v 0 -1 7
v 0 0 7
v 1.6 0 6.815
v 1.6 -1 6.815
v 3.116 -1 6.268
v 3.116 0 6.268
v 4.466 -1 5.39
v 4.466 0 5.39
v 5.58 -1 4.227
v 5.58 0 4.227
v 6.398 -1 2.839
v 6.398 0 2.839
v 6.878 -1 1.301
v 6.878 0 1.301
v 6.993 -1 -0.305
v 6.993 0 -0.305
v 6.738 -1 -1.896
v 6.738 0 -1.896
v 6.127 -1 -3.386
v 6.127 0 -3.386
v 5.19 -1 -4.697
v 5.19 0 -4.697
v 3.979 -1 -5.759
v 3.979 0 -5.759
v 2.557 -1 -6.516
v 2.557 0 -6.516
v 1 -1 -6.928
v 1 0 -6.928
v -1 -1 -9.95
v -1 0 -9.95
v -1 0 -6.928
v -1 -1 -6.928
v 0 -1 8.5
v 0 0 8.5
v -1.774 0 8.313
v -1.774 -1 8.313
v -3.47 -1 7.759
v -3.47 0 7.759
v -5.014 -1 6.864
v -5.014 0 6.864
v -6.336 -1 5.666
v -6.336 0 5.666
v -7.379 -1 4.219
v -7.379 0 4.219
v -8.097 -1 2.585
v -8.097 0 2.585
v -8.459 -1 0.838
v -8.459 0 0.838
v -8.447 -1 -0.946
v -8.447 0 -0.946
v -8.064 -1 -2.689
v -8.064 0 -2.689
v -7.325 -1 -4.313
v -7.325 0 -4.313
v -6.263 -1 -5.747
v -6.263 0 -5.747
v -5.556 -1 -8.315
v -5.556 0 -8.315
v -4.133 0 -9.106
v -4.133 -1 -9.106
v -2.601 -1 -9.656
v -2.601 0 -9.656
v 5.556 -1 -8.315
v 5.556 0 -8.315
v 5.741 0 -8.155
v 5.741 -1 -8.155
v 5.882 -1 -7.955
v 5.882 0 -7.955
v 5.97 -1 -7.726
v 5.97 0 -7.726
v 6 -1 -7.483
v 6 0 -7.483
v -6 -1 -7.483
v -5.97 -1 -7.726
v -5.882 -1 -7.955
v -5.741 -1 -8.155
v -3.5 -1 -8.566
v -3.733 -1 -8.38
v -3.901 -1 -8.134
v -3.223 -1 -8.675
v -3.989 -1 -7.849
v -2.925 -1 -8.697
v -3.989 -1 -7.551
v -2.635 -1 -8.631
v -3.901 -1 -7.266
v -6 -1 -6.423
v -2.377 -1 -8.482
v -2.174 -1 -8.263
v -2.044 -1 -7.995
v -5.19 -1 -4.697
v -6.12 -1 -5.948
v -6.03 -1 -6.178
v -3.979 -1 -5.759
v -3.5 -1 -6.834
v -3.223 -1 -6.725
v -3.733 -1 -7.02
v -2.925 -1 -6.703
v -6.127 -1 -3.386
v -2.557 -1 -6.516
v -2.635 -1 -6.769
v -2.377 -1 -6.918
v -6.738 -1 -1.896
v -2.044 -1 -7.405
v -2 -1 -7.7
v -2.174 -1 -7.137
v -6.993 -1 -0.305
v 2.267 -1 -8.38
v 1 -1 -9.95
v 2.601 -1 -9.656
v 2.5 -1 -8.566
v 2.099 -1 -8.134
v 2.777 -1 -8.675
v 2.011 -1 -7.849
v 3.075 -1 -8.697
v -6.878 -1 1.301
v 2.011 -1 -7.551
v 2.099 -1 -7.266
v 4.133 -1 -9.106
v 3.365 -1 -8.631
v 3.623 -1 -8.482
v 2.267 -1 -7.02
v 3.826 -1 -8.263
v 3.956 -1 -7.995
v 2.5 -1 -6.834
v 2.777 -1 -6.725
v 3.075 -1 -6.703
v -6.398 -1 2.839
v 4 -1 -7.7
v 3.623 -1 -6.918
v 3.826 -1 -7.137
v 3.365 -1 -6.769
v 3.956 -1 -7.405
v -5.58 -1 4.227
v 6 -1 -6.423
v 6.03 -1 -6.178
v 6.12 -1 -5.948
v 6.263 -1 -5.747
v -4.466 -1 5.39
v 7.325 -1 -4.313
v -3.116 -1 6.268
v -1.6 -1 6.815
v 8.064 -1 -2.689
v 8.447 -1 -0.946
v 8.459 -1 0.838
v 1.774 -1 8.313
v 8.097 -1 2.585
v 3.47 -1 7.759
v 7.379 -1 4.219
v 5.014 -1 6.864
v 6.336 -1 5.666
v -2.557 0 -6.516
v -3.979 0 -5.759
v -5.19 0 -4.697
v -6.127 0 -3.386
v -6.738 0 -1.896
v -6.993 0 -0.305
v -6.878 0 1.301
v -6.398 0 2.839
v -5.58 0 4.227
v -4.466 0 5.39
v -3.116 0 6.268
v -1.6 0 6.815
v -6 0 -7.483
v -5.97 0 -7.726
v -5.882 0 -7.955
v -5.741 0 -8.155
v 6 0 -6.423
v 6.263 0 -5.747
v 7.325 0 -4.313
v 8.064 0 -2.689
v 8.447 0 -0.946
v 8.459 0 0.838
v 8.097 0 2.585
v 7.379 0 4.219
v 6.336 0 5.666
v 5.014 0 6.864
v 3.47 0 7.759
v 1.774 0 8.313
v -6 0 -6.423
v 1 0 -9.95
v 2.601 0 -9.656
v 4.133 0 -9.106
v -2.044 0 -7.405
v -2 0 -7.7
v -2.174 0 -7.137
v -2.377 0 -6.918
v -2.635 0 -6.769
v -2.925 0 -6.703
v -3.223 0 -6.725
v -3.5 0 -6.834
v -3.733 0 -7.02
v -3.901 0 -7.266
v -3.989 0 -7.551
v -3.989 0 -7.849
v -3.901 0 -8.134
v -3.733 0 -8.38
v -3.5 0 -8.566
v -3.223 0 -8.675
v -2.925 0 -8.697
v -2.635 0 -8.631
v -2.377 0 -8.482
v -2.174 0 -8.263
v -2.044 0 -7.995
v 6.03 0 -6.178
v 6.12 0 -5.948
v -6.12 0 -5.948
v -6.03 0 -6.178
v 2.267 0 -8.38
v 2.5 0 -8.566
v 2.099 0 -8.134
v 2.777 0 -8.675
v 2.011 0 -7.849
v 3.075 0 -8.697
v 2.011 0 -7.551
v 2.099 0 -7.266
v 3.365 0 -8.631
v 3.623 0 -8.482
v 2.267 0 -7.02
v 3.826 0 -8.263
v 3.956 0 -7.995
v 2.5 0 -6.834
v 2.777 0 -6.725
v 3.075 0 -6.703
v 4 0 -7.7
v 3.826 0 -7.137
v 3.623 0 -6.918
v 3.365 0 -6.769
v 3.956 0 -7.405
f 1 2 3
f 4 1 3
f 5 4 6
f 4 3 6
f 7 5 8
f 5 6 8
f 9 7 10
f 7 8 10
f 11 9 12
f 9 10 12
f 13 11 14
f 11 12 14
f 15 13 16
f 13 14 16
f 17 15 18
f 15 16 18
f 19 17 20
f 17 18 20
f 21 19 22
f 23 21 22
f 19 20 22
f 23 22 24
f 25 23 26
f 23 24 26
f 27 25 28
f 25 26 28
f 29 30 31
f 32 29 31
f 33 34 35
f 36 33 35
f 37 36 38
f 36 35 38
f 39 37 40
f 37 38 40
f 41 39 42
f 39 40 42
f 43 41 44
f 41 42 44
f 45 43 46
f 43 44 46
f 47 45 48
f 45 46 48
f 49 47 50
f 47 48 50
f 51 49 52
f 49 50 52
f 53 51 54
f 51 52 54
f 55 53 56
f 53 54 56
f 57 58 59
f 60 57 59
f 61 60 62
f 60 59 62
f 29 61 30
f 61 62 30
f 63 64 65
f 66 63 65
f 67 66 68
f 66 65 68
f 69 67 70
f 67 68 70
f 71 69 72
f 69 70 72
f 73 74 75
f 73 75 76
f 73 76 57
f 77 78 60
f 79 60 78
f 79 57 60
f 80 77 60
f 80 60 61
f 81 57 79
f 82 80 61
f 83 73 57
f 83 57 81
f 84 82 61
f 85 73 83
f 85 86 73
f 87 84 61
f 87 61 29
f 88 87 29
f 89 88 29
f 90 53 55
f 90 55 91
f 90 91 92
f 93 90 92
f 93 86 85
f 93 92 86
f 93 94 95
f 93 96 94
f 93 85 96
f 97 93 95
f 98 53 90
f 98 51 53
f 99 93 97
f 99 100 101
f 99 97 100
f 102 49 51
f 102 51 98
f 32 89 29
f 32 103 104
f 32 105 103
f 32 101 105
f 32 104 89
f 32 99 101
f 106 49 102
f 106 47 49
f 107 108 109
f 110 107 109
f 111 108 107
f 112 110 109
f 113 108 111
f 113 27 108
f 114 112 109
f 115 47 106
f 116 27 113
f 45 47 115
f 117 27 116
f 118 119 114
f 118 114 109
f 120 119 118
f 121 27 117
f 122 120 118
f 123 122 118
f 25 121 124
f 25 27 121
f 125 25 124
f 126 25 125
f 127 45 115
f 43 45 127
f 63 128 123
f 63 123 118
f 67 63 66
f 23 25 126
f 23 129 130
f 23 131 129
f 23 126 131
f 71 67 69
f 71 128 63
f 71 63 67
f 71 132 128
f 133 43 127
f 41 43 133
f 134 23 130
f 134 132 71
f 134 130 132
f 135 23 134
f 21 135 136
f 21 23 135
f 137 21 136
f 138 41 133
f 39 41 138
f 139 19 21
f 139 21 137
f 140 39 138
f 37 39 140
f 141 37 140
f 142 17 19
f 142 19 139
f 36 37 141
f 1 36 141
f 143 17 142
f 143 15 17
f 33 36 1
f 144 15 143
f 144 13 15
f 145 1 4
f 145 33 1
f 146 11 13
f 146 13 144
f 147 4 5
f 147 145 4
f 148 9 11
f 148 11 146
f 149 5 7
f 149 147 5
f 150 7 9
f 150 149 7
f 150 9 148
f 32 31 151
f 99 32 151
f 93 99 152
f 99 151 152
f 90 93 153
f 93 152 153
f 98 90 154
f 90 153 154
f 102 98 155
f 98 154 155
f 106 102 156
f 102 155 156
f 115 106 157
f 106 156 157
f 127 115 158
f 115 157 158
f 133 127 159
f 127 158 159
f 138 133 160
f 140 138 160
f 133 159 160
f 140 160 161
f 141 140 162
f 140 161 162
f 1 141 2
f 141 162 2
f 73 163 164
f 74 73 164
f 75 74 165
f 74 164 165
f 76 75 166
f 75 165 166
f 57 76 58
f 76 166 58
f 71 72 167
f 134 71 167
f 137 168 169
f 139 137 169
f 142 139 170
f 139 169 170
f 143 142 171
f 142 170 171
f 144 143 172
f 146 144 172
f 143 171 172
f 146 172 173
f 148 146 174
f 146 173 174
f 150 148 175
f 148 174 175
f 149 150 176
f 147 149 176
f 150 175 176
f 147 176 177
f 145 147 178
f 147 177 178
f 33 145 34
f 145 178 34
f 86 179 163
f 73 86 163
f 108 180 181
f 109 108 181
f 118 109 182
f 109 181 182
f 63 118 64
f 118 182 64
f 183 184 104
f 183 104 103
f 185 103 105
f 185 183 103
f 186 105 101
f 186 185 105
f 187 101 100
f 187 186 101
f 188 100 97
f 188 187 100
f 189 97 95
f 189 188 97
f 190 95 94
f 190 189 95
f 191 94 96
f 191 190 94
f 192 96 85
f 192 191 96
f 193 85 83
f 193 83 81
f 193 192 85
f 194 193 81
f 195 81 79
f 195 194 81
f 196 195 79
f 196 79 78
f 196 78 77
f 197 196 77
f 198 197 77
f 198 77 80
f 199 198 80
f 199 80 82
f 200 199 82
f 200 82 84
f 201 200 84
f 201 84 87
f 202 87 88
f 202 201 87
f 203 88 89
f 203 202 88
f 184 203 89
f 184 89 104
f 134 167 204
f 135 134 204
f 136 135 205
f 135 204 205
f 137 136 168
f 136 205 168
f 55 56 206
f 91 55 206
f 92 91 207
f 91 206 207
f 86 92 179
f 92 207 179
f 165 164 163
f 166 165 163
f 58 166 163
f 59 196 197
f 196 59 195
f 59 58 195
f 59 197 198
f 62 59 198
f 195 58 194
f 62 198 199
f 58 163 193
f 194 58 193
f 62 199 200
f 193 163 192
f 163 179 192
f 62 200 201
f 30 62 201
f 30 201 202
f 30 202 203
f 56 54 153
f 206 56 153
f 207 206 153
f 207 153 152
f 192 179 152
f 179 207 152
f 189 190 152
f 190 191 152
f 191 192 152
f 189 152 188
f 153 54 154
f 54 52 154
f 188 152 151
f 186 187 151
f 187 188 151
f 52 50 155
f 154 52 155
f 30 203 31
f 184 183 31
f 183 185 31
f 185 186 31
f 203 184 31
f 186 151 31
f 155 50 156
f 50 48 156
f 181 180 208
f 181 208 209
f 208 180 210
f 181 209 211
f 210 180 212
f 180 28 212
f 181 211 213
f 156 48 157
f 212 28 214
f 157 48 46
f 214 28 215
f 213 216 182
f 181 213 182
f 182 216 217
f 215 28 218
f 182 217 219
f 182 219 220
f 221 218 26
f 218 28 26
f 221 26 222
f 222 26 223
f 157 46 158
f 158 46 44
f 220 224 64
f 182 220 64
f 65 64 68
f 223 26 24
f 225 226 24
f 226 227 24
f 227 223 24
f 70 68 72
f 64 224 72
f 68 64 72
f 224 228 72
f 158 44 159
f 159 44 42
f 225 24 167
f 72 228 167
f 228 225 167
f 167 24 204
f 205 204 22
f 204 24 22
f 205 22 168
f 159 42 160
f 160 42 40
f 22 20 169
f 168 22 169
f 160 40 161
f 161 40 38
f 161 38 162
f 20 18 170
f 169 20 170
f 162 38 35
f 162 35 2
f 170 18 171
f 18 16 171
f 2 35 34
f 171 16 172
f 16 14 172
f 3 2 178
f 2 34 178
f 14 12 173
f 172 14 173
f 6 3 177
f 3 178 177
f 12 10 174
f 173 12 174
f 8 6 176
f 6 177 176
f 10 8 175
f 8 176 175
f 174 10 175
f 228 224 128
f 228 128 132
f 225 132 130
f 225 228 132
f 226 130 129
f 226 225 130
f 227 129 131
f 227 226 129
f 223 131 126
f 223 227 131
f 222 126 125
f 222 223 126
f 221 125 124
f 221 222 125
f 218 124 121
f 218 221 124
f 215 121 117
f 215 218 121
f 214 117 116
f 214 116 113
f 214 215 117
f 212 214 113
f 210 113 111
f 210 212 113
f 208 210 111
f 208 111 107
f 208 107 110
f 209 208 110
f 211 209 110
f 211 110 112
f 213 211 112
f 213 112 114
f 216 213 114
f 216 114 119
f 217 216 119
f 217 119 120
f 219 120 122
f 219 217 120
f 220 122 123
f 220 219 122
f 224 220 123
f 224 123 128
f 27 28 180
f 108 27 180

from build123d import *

# Parameters (mm, degrees)
F0_R     = 1
F1_DEPTH = 1


with BuildPart() as f1:
    # F0 (on Front) → F1 (new body)
    with BuildSketch(Plane.XZ):
        with BuildLine():
            ThreePointArc((-1, -6.928203), (-6.982028, 0.501287), (0, 7))
            Line((0, 7), (0, 8.5))
            ThreePointArc((0, 8.5), (-7.781249, 3.420841), (-6.263158, -5.746551))
            ThreePointArc((-6.263158, -5.746551), (-6.068109, -6.059878), (-6, -6.422616))
            Line((-6, -6.422616), (-6, -7.483315))
            ThreePointArc((-6, -7.483315), (-5.881917, -7.954719), (-5.555556, -8.314794))
            ThreePointArc((-5.555556, -8.314794), (-3.378195, -9.412109), (-1, -9.949874))
            Line((-1, -9.949874), (-1, -6.928203))
        make_face()
        with Locations((-3, -7.7)):
            Circle(F0_R, mode=Mode.SUBTRACT)
        with BuildLine():
            ThreePointArc((0, 7), (6.982028, 0.501287), (1, -6.928203))
            Line((1, -6.928203), (1, -9.949874))
            ThreePointArc((1, -9.949874), (3.378195, -9.412109), (5.555556, -8.314794))
            ThreePointArc((5.555556, -8.314794), (5.881917, -7.954719), (6, -7.483315))
            Line((6, -7.483315), (6, -6.422616))
            ThreePointArc((6, -6.422616), (6.068109, -6.059878), (6.263158, -5.746551))
            ThreePointArc((6.263158, -5.746551), (7.781249, 3.420841), (0, 8.5))
            Line((0, 8.5), (0, 7))
        make_face()
        with Locations((3, -7.7)):
            Circle(F0_R, mode=Mode.SUBTRACT)
    extrude(amount=F1_DEPTH)


solid = f1.part
